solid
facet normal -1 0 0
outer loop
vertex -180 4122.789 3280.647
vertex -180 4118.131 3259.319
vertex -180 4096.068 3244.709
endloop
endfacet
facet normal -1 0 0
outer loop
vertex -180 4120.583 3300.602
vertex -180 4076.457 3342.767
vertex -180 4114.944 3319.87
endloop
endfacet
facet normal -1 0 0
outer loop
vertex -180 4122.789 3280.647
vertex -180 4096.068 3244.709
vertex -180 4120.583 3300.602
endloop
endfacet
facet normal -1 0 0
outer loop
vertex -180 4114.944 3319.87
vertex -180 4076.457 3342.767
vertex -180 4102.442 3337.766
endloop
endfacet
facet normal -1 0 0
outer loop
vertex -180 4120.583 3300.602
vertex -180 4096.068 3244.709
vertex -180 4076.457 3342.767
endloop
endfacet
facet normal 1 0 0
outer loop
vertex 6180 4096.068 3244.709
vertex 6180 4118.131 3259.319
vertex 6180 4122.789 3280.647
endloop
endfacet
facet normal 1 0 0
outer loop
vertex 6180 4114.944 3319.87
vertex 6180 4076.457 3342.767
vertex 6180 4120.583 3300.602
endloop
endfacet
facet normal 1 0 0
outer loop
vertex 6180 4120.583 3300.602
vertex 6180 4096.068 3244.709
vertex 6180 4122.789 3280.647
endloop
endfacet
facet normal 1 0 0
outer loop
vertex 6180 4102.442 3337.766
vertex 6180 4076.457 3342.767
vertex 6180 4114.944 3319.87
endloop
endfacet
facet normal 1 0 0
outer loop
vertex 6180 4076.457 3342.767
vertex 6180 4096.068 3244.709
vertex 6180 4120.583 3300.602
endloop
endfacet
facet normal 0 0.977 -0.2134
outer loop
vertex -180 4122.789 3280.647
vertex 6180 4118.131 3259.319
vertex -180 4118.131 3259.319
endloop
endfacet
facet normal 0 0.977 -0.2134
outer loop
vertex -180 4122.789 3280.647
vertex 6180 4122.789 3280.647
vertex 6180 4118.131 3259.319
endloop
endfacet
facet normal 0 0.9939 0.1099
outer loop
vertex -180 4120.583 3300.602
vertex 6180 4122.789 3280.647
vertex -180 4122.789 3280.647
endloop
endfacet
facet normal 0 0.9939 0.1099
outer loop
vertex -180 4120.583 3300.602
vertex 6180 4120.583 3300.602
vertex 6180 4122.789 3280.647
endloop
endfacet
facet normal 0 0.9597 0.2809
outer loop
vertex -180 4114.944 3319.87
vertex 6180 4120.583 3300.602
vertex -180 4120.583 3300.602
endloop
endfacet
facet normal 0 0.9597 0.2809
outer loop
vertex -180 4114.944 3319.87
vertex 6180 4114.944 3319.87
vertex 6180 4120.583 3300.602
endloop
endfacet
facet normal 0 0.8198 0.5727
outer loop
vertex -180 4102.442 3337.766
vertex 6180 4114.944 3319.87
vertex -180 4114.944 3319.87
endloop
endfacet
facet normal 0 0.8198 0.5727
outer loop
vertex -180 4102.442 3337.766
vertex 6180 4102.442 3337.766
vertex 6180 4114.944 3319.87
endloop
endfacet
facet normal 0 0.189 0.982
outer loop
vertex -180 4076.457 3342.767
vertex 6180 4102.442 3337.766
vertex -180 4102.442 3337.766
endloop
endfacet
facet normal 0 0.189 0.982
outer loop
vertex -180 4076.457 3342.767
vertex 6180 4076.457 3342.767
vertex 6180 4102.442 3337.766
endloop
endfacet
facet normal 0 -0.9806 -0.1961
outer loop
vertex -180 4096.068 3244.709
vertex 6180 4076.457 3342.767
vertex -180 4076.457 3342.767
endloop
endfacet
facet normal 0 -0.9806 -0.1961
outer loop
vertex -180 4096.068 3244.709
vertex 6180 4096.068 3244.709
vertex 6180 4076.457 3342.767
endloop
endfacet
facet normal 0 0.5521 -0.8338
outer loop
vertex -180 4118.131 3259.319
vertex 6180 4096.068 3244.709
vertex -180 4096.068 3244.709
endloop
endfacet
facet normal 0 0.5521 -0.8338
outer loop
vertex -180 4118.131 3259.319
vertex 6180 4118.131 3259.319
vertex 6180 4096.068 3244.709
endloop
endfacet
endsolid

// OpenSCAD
// file: tea_shop_roof_parameters.scad
// =============================================================================
// Tea Shop — GROUP 2: ROOF PARAMETERS
// -----------------------------------------------------------------------------
// OpenSCAD native unit: 1 mm (1000 mm = 1.0 m). Real-life scale.
// Reuses Group 1 (Base & Shell) dimensions and shared global coordinate system:
//   +X -> left -> right  (building width along X, left wall at X = 0)
//   +Y -> front -> back  (building depth along Y, front eave at Y = 0)
//   +Z -> up             (ground / plinth datum = Z = 0)
// =============================================================================

// --- SHARED GLOBAL VARIABLES FROM GROUP 1 (identical values) -----------------
WALL_T             = 250;   // wall panel thickness                      (0.25 m)
BUILD_W            = 6000;  // building width along X, left -> right      (6.00 m)
BUILD_D            = 4000;  // building depth along Y, front eave -> back (4.00 m)
BACK_H             = 3200;  // full wall height at the BACK (tall side)   (3.20 m)
FRONT_H            = 2400;  // wall height at the FRONT eave (short side) (2.40 m)

// Aliases matching Group 1's tea_shop_parameters.scad naming convention
wall_thickness     = WALL_T;
building_width     = BUILD_W;
building_depth     = BUILD_D;
back_height        = BACK_H;
front_eave_height  = FRONT_H;

// --- GROUP 2: ROOF SLAB & OVERHANG PARAMETERS --------------------------------
ROOF_THICKNESS      = 50;   // structural substrate slab thickness       (0.05 m)
ROOF_OVERHANG_LEFT  = 150;  // overhang beyond outer face of left wall    (0.15 m)
ROOF_OVERHANG_RIGHT = 150;  // overhang beyond outer face of right wall   (0.15 m)
ROOF_OVERHANG_BACK  = 150;  // overhang beyond outer face of back wall    (0.15 m)
ROOF_OVERHANG_FRONT = 250;  // overhang forward past front eave wall      (0.25 m)
                            // (Estimated: in reference images, the tiled roof
                            //  terminates ~250mm past the front wall where the
                            //  pergola rafters tie in. Tune here if desired.)

// --- FASCIA / BARGEBOARD TRIM PARAMETERS ------------------------------------
FASCIA_THICKNESS    = 30;   // board thickness (along X for sides, Y for front)
FASCIA_WIDTH        = 100;  // board face height (normal to roof plane)

// --- TOP RIDGE CAPPING STRIP PARAMETERS -------------------------------------
// (Raised capping strip running along the highest back edge where roof meets
//  back wall, visible in wireframe and clay renders to seal top tile ends)
RIDGE_CAP_WIDTH     = 100;  // width / run of capping strip along slope   (0.10 m)
RIDGE_CAP_HEIGHT    = 35;   // raised bump height of capping strip        (0.035 m)

// --- TERRACOTTA ROOF TILE GEOMETRY PARAMETERS -------------------------------
// Shallow repeating barrel / curved ridges running down the slope direction
TILE_PITCH          = 175;  // center-to-center spacing along X between tile crests
TILE_WIDTH          = 120;  // width of each individual curved tile crest
TILE_HEIGHT         = 25;   // raised crest height of tile bump above slab
TILE_FN             = 16;   // polygon facets for lightweight STL export

// =============================================================================
// MATHEMATICAL SLOPE DERIVATION (Trig / Geometry)
// -----------------------------------------------------------------------------
// The monopitch lean-to roof connects the top of the short front wall (Z=FRONT_H
// at Y=0) to the top of the tall back wall (Z=BACK_H at Y=BUILD_D).
//
//   Vertical Rise : ROOF_RISE  = BACK_H - FRONT_H = 3200 - 2400 = 800 mm
//   Horizontal Run: ROOF_RUN   = BUILD_D = 4000 mm
//   Slope Tangent : tan(theta) = Rise / Run = 800 / 4000 = 0.20
//   Slope Angle   : ROOF_ANGLE = atan(0.20) ≈ 11.30993°
//
// Using the exact trigonometric angle prevents any height drift between the
// walls and the roof.
// =============================================================================
ROOF_RISE           = BACK_H - FRONT_H;
ROOF_RUN            = BUILD_D;
ROOF_ANGLE          = atan(ROOF_RISE / ROOF_RUN);

// Total projected extents:
ROOF_WIDTH          = BUILD_W + ROOF_OVERHANG_LEFT + ROOF_OVERHANG_RIGHT;
ROOF_DEPTH_PROJ     = BUILD_D + ROOF_OVERHANG_FRONT + ROOF_OVERHANG_BACK;

// True length along the sloped roof plane (hypotenuse of total run and rise):
ROOF_SLOPE_LEN      = ROOF_DEPTH_PROJ / cos(ROOF_ANGLE);

// Reference coordinate for the sloped roof frame:
// Origin at the lowest front-left corner of the sloped roof slab bottom face
ROOF_ORIGIN_X       = -ROOF_OVERHANG_LEFT;
ROOF_ORIGIN_Y       = -ROOF_OVERHANG_FRONT;
ROOF_ORIGIN_Z       = FRONT_H - ROOF_OVERHANG_FRONT * tan(ROOF_ANGLE);
// file: tea_shop_roof_modules.scad
// =============================================================================
// Tea Shop — GROUP 2: ROOF MODULE LIBRARY
// -----------------------------------------------------------------------------
// This file DEFINES all roof parts (and visual assemble() preview).
// It creates NO geometry on its own when included, allowing individual
// export parts (part_*.scad) and the assembly file to include it cleanly.
//
// SHARED GLOBAL COORDINATE SYSTEM:
//   +X -> left -> right  (0 = left wall outer face, BUILD_W = right wall)
//   +Y -> front -> back  (0 = front eave wall face, BUILD_D = back wall)
//   +Z -> up             (0 = plinth / porch floor datum)
//
// All parts are positioned in place so exported STLs align without manual transforms.
//
// TODO: The wooden pergola structure (posts, crossbeams, longitudinal purlins,
//       flat roof slats, and signboard brackets) is a separate upcoming group
//       and will attach along the front eave edge (Y = -ROOF_OVERHANG_FRONT to 0)
//       extending forward over the porch slab (-base_front_margin .. 0).
// =============================================================================

include <tea_shop_roof_parameters.scad>;

// -----------------------------------------------------------------------------
// _roof_transform — internal transformation helper.
// Translates to the lowest front-left corner of the roof slab bottom face
// (X = -ROOF_OVERHANG_LEFT, Y = -ROOF_OVERHANG_FRONT, Z = ROOF_ORIGIN_Z)
// and rotates around the X-axis by ROOF_ANGLE (pitch angle).
//
// In the child coordinate system:
//   local X : across roof width [0 .. ROOF_WIDTH]
//   local Y : along roof slope UP from front eave to back [0 .. ROOF_SLOPE_LEN]
//   local Z : normal (perpendicular) to the roof plane, pointing up [0 .. thickness]
// -----------------------------------------------------------------------------
module _roof_transform() {
    translate([ROOF_ORIGIN_X, ROOF_ORIGIN_Y, ROOF_ORIGIN_Z])
        rotate([ROOF_ANGLE, 0, 0])
            children();
}


// =============================================================================
// 1. roof_slab — the structural roof substrate.
// A flat slanted slab resting directly on top of the front, back, and side walls.
// Overhangs the building on left, right, and back, and projects forward past
// the front eave to shelter the front wall and meet the pergola frame.
// =============================================================================
module roof_slab() {
    _roof_transform()
        cube([ROOF_WIDTH, ROOF_SLOPE_LEN, ROOF_THICKNESS]);
}


// =============================================================================
// 2. ridge_cap_or_top_trim — raised cap strip along the high back edge.
// As confirmed in the wireframe (countryside-tea-shop-3d-model-9cc7378ff7.webp)
// and clay render (countryside-tea-shop-3d-model-4b97af2b49.webp), this is a
// raised half-round/chamfered capping strip running along the very top edge of
// the roof where it meets the tall back wall, sealing the tile ends against weather.
// =============================================================================
module _ridge_cap_profile_2d() {
    polygon(points = [
        [-RIDGE_CAP_WIDTH/2, 0],
        [-RIDGE_CAP_WIDTH*0.4, RIDGE_CAP_HEIGHT*0.7],
        [-RIDGE_CAP_WIDTH*0.2, RIDGE_CAP_HEIGHT*0.95],
        [ 0,                   RIDGE_CAP_HEIGHT],
        [ RIDGE_CAP_WIDTH*0.2, RIDGE_CAP_HEIGHT*0.95],
        [ RIDGE_CAP_WIDTH*0.4, RIDGE_CAP_HEIGHT*0.7],
        [ RIDGE_CAP_WIDTH/2, 0]
    ]);
}

module ridge_cap_or_top_trim() {
    _roof_transform() {
        translate([-FASCIA_THICKNESS, ROOF_SLOPE_LEN - RIDGE_CAP_WIDTH/2, ROOF_THICKNESS + TILE_HEIGHT])
            rotate([0, 90, 0])
                linear_extrude(height = ROOF_WIDTH + 2 * FASCIA_THICKNESS)
                    _ridge_cap_profile_2d();
    }
}


// =============================================================================
// 3. eave_fascia_left and eave_fascia_right — wooden trim boards running along
// the left and right sloped edges (rakes/verges) of the roof slab.
// Visible in textured renders as the dark timber strips along the outer roof edges.
// Covers both the slab edge and tile profile, extending slightly below the slab.
// =============================================================================
module eave_fascia_left() {
    _roof_transform() {
        translate([-FASCIA_THICKNESS, 0, -(FASCIA_WIDTH - ROOF_THICKNESS)/2])
            cube([FASCIA_THICKNESS, ROOF_SLOPE_LEN, FASCIA_WIDTH]);
    }
}

module eave_fascia_right() {
    _roof_transform() {
        translate([ROOF_WIDTH, 0, -(FASCIA_WIDTH - ROOF_THICKNESS)/2])
            cube([FASCIA_THICKNESS, ROOF_SLOPE_LEN, FASCIA_WIDTH]);
    }
}


// =============================================================================
// 4. eave_fascia_front — horizontal trim board running across the low front
// eave of the roof slab, immediately above where the pergola structure connects.
// =============================================================================
module eave_fascia_front() {
    _roof_transform() {
        translate([-FASCIA_THICKNESS, -FASCIA_THICKNESS, -(FASCIA_WIDTH - ROOF_THICKNESS)/2])
            cube([ROOF_WIDTH + 2 * FASCIA_THICKNESS, FASCIA_THICKNESS, FASCIA_WIDTH]);
    }
}


// =============================================================================
// 5. roof_tile_pattern — shallow repeating bump/ridge pattern on the top face
// of roof_slab(), representing the terracotta barrel tiles visible in the renders.
// Modeled as real geometry using lightweight 2D extruded curved crests running
// down the slope direction (local Y) and repeated along local X with a for loop.
// Parametric spacing (TILE_PITCH) and bump size (TILE_WIDTH, TILE_HEIGHT) allow
// tuning print resolution and file size.
// =============================================================================
module _tile_crest_2d() {
    polygon(points = [
        [-TILE_WIDTH * 0.50, 0],
        [-TILE_WIDTH * 0.42, TILE_HEIGHT * 0.50],
        [-TILE_WIDTH * 0.28, TILE_HEIGHT * 0.85],
        [0,                  TILE_HEIGHT],
        [ TILE_WIDTH * 0.28, TILE_HEIGHT * 0.85],
        [ TILE_WIDTH * 0.42, TILE_HEIGHT * 0.50],
        [ TILE_WIDTH * 0.50, 0]
    ]);
}

module roof_tile_pattern() {
    _roof_transform() {
        rotate([90, 0, 0])
        translate([0, ROOF_THICKNESS, -ROOF_SLOPE_LEN])
        linear_extrude(height = ROOF_SLOPE_LEN) {
            for (x = [TILE_PITCH/2 : TILE_PITCH : ROOF_WIDTH - TILE_PITCH/2]) {
                translate([x, 0, 0])
                    _tile_crest_2d();
            }
        }
    }
}


// =============================================================================
// assemble — visual verification assembly for Group 2 pieces (not for export).
// Displays each module in a distinct contrasting color.
// =============================================================================
module assemble() {
    color("Tan")          roof_slab();
    color("Chocolate")    roof_tile_pattern();
    color("DarkRed")      ridge_cap_or_top_trim();
    color("SaddleBrown")  eave_fascia_left();
    color("SaddleBrown")  eave_fascia_right();
    color("SaddleBrown")  eave_fascia_front();
}
// main file
// =============================================================================
// part_ridge_cap.scad — export the TOP RIDGE CAPPING STRIP only.
// Press F6 (render), then export as STL.
// =============================================================================

include <tea_shop_roof_modules.scad>;

ridge_cap_or_top_trim();
